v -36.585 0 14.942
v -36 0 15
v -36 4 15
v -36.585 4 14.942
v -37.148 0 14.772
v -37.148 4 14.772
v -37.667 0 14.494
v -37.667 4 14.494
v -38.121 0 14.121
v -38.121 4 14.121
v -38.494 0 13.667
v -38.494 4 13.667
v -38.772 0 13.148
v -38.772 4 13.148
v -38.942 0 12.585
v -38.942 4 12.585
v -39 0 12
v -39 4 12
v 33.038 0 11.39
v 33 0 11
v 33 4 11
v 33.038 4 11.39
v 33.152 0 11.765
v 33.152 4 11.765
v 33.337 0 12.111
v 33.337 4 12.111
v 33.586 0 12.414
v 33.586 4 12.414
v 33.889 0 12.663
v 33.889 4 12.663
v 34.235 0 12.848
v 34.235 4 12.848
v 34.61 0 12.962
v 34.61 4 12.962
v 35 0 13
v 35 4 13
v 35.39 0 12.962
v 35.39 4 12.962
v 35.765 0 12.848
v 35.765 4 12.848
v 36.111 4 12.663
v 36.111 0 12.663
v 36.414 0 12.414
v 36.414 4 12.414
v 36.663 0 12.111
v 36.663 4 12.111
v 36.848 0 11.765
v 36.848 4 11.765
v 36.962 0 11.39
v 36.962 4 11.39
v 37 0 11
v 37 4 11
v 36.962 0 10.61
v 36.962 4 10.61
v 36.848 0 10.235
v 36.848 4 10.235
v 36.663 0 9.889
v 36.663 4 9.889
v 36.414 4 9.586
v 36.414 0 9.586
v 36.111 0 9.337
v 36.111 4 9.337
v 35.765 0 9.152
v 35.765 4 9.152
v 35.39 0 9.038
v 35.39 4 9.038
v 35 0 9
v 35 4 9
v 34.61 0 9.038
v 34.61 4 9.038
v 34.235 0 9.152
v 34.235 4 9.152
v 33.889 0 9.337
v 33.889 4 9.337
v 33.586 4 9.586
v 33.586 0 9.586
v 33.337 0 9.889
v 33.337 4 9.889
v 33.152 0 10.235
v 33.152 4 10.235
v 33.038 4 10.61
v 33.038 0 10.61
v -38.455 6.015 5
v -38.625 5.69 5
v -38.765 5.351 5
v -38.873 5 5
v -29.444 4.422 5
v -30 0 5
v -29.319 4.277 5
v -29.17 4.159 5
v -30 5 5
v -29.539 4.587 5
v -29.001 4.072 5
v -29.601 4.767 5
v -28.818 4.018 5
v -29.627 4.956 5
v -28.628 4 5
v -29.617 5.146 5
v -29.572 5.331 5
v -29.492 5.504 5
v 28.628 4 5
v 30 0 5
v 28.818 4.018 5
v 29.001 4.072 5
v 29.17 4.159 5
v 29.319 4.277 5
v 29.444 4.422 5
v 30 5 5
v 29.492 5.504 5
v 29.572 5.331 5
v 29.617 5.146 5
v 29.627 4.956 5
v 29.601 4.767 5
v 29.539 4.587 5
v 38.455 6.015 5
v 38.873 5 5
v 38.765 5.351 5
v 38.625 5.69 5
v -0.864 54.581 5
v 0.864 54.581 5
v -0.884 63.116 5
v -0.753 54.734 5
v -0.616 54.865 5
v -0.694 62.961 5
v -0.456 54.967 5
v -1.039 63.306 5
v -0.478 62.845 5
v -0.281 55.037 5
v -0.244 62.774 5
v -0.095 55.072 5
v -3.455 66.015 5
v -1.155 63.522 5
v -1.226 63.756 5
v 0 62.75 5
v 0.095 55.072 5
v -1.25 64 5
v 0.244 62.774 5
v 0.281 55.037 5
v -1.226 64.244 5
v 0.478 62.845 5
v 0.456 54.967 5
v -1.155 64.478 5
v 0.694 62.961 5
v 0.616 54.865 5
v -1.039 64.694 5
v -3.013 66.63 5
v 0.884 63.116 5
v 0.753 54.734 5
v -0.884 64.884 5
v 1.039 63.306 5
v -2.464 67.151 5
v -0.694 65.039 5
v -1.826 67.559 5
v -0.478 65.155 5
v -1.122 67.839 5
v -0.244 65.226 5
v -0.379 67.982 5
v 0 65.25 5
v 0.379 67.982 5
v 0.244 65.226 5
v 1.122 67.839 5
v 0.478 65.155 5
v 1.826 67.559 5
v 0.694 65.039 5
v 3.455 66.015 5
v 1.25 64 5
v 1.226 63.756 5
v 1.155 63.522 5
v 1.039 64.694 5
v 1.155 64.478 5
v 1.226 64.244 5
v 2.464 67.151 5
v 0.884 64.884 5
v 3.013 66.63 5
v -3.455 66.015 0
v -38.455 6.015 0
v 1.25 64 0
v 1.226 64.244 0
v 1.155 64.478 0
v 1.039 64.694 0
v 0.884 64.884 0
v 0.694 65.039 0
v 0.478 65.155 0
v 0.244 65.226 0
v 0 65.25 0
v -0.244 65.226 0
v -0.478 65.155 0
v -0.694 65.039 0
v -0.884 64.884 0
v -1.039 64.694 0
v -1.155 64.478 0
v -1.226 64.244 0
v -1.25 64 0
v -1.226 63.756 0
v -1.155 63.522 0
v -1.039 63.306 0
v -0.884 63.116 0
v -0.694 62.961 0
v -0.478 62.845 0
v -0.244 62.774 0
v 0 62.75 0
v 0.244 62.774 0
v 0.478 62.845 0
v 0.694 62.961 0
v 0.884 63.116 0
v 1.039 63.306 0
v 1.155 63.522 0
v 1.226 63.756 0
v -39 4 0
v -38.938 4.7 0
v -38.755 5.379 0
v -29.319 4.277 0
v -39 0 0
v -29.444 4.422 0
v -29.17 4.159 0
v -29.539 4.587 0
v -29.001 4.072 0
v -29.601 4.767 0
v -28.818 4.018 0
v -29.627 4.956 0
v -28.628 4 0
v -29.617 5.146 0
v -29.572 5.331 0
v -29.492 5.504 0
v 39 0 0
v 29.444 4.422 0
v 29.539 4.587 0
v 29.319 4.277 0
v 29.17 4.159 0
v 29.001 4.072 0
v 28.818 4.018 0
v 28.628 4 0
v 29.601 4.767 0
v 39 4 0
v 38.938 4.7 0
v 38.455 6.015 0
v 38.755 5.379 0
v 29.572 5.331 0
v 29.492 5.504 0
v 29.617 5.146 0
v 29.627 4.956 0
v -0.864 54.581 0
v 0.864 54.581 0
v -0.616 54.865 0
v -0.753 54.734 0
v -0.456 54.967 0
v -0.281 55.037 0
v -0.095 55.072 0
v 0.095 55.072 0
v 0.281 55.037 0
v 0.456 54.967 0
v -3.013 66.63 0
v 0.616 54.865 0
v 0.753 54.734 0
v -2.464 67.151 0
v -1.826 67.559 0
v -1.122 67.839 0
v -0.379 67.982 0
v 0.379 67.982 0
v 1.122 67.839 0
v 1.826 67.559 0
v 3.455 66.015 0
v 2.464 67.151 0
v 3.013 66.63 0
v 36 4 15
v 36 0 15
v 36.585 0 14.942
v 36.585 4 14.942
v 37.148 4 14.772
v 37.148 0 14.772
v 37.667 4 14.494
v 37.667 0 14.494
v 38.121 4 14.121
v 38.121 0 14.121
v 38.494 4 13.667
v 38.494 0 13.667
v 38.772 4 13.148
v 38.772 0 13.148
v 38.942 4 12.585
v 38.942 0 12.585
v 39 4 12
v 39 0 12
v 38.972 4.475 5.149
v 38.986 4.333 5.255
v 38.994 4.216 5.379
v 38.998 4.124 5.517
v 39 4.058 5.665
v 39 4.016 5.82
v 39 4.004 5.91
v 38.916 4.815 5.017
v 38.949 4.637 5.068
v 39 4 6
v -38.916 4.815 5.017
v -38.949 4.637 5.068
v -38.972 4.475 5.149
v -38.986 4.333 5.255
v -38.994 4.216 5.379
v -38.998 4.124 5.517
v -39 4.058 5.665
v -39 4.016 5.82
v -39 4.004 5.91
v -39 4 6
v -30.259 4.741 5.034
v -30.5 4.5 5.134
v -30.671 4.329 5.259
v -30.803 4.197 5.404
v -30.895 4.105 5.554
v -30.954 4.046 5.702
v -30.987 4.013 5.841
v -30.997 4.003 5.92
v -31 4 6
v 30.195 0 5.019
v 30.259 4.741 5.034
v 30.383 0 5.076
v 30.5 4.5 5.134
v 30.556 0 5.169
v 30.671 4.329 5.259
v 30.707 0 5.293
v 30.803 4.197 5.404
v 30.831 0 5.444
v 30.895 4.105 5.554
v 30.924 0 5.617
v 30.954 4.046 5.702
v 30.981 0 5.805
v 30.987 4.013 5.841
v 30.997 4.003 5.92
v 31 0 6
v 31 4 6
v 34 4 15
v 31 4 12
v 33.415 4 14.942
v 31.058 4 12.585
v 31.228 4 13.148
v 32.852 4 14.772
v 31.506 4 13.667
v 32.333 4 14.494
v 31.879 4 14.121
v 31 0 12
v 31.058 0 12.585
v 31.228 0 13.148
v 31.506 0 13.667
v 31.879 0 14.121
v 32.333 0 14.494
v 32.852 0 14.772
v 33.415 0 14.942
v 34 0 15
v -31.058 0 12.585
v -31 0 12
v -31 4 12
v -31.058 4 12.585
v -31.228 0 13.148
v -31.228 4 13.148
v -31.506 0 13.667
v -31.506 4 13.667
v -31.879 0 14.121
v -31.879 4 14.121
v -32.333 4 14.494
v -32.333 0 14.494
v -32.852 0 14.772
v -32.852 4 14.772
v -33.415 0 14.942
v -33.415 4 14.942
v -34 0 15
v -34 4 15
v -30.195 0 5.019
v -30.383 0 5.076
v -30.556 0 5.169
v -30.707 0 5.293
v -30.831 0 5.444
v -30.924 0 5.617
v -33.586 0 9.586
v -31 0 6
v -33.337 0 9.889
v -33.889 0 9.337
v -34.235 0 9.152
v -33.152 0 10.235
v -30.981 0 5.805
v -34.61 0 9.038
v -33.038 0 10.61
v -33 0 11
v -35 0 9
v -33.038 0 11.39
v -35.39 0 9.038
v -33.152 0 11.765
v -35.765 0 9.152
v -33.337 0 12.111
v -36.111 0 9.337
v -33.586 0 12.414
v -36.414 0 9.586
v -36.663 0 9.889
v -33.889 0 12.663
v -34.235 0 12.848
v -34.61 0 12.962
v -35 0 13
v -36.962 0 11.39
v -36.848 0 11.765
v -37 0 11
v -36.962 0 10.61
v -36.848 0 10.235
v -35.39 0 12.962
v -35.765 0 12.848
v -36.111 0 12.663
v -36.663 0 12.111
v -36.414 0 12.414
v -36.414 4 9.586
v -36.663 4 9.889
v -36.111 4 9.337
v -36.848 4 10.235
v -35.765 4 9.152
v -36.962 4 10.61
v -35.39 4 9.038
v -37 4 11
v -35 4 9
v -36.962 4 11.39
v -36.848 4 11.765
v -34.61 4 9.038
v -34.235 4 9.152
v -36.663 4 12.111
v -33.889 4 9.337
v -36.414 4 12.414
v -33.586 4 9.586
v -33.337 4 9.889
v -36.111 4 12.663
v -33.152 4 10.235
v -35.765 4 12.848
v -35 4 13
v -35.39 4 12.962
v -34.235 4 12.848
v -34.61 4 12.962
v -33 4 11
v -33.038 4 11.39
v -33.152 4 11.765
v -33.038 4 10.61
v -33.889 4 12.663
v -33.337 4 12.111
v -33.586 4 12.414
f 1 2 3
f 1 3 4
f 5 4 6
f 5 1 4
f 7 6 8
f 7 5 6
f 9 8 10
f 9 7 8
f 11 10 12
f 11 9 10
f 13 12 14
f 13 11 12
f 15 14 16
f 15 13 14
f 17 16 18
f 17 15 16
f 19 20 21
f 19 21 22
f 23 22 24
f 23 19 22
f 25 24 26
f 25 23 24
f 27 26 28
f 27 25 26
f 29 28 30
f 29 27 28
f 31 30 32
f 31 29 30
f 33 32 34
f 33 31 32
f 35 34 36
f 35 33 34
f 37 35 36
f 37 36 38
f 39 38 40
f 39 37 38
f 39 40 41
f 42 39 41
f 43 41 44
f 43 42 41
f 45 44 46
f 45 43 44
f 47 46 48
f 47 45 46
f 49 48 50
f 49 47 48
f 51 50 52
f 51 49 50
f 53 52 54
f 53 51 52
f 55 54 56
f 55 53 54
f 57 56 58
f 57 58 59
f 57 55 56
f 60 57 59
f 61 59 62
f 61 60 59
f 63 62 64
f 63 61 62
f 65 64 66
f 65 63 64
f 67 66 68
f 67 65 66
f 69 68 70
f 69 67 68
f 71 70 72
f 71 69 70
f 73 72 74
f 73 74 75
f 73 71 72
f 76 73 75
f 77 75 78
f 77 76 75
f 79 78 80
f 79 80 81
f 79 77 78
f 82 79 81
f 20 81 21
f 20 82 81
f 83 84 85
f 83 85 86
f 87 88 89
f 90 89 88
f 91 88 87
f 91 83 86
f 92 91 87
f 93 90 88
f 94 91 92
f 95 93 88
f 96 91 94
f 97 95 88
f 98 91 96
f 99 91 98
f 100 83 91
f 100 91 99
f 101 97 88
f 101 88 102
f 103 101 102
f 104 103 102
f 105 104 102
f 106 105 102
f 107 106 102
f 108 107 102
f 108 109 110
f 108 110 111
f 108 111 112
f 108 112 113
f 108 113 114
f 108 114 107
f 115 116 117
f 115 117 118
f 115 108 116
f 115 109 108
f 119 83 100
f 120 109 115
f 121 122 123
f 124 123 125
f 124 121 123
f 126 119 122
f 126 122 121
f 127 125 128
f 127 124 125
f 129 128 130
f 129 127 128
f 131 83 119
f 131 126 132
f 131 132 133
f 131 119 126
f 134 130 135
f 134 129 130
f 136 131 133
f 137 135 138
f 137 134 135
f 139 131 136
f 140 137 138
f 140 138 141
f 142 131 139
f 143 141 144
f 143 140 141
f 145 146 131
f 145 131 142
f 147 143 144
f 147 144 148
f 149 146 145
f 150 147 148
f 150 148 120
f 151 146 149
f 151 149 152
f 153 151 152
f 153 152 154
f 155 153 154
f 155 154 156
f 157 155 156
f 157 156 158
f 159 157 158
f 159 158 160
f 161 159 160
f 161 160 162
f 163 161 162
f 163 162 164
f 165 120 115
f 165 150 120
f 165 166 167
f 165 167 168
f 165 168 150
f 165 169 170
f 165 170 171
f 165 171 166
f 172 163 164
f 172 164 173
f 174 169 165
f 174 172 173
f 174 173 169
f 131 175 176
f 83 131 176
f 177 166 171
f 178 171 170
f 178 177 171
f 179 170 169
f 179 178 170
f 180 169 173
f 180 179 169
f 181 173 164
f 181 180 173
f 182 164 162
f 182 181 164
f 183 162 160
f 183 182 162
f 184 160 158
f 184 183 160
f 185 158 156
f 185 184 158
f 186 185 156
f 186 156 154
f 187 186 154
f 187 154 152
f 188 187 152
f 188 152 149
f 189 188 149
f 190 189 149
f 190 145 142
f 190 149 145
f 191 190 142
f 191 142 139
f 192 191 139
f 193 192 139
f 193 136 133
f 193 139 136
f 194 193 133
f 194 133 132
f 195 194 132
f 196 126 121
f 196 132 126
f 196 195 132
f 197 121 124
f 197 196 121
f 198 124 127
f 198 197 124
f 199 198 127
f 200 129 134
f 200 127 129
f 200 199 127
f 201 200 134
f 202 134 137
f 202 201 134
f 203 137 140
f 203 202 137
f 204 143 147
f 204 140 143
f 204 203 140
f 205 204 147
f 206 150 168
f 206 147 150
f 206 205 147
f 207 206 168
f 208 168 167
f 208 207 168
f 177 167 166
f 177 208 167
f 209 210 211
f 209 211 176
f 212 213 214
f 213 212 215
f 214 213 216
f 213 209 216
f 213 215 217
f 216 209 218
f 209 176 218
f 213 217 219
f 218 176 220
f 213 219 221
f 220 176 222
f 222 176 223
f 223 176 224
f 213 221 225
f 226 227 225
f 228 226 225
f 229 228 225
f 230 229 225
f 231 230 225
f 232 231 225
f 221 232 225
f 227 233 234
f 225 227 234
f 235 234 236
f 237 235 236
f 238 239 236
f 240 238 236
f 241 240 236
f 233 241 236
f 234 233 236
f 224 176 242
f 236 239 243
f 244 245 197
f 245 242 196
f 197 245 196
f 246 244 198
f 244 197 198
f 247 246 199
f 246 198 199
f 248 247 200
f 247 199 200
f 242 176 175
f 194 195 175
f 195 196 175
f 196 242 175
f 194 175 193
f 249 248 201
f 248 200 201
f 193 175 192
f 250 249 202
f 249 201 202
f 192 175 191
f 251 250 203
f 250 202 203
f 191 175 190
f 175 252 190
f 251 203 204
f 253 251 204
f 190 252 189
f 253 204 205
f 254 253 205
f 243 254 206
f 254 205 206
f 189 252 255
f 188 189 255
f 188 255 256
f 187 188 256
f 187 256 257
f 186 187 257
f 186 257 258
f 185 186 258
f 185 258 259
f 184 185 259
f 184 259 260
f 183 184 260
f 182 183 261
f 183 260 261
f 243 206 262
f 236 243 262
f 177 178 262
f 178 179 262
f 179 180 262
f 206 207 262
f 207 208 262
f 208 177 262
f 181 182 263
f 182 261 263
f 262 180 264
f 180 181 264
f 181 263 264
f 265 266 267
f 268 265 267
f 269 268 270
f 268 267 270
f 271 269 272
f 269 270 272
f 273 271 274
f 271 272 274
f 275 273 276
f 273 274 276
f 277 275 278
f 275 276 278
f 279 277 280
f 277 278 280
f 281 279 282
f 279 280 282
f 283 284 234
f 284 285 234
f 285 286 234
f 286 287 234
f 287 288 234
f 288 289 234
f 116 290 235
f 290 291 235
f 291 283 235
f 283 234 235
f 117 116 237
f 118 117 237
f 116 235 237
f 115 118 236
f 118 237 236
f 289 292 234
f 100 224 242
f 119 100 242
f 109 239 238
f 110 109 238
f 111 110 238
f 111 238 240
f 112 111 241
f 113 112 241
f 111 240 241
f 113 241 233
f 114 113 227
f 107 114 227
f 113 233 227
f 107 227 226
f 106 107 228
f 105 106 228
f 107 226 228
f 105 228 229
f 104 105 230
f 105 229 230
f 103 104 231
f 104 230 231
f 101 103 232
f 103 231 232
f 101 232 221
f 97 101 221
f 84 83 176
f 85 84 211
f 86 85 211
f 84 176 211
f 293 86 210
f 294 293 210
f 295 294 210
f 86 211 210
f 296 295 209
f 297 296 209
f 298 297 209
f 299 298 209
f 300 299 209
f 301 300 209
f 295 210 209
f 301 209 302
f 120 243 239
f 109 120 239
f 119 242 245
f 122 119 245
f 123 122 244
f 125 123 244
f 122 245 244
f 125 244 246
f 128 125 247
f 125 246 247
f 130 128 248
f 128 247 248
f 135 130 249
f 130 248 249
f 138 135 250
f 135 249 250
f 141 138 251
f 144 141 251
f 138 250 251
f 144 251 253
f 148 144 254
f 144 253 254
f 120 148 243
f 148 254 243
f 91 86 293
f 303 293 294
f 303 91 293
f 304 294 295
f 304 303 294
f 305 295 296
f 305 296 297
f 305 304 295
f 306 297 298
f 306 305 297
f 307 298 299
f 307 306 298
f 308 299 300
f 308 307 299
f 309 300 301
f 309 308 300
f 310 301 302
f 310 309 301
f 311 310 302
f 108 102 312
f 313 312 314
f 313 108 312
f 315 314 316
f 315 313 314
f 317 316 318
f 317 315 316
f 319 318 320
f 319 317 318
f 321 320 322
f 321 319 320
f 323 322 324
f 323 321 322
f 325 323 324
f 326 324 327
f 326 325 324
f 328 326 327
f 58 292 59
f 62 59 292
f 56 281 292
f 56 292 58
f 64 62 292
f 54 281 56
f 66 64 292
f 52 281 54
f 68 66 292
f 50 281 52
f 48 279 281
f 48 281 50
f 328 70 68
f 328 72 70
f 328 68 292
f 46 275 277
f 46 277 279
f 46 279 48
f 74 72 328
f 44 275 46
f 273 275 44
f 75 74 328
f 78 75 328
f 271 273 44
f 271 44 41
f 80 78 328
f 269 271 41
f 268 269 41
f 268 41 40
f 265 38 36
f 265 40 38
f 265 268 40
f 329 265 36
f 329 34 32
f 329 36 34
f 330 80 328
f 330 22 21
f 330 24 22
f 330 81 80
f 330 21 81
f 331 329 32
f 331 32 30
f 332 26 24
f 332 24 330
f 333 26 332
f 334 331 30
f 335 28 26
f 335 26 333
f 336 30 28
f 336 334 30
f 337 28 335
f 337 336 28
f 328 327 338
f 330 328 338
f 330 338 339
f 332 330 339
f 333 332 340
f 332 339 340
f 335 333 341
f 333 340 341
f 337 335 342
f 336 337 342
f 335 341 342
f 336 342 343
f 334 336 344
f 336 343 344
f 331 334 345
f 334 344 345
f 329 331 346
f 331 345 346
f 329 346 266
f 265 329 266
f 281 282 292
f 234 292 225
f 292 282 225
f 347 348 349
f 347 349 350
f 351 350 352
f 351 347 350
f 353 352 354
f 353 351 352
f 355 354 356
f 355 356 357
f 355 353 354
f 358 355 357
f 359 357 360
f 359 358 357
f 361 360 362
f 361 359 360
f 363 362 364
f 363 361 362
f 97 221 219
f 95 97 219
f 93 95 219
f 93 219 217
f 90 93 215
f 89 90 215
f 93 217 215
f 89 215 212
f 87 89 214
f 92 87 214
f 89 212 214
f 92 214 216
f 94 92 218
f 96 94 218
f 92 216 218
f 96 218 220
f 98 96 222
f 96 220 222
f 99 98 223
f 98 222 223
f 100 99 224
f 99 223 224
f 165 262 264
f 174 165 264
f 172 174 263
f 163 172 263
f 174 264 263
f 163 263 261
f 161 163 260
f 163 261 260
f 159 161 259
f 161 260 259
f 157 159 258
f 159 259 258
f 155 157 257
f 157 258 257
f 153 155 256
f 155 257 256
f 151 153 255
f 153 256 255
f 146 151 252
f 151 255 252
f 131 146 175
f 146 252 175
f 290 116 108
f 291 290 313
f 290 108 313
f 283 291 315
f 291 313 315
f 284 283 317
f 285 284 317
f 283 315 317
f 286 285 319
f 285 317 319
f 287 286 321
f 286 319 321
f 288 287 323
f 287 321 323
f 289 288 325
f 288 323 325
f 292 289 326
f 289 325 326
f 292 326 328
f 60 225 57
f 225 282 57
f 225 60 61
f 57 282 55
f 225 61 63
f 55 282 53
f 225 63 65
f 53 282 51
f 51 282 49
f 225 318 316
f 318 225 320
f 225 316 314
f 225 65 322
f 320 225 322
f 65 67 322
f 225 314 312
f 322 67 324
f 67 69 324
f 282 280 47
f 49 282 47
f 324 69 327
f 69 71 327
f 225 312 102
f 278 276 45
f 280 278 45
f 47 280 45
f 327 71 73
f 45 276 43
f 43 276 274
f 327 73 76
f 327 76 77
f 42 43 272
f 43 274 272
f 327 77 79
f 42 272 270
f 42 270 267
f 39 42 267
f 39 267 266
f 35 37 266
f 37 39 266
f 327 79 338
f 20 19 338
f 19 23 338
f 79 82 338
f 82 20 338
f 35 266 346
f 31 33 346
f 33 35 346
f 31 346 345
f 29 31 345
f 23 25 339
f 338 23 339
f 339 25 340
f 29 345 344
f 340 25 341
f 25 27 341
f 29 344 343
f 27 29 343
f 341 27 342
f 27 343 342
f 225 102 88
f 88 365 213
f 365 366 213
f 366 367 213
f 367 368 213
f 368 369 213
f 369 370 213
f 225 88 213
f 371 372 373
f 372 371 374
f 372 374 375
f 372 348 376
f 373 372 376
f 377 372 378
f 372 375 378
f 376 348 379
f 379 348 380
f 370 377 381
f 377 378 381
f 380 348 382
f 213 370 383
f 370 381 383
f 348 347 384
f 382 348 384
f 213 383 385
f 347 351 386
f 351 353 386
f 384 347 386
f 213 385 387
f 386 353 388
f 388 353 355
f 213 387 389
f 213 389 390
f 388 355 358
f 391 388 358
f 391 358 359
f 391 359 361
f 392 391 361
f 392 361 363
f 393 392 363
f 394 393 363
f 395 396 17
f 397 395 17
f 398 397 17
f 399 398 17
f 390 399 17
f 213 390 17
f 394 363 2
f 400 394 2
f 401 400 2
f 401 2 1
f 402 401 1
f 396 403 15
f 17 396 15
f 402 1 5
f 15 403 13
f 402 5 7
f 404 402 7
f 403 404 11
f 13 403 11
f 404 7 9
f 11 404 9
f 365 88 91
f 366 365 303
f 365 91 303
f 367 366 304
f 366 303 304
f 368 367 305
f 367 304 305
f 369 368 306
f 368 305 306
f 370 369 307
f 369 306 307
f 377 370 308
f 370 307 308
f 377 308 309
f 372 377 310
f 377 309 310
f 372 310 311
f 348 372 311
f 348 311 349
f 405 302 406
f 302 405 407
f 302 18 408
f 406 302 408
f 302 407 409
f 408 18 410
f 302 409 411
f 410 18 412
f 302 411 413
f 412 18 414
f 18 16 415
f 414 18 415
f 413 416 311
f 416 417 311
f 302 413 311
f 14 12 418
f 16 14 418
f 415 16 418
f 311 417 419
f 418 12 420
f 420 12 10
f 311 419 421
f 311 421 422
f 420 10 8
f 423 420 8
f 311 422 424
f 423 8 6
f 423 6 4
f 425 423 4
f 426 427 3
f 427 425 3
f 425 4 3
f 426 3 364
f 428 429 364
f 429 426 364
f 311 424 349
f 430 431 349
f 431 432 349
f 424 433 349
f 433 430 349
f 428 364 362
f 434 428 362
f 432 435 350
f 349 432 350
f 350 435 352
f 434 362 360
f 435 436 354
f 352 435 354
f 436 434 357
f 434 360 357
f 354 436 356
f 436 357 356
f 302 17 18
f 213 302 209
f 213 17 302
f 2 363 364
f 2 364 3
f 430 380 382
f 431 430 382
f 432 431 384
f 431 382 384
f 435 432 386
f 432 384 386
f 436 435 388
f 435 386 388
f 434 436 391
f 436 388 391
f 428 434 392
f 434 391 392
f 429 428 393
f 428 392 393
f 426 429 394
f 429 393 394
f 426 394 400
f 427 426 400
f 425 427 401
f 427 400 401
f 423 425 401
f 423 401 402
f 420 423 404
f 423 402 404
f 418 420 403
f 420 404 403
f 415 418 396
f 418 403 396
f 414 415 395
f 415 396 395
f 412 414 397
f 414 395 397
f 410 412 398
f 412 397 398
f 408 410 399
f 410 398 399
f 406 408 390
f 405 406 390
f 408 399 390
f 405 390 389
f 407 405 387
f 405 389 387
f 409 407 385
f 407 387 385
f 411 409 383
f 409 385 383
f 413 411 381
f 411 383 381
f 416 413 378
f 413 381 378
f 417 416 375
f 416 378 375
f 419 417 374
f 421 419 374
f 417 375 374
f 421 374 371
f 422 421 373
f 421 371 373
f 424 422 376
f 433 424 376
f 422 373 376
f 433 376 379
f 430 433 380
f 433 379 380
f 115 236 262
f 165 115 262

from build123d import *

# Parameters (mm, degrees)
F0_R     = 1.25
F1_DEPTH = 5
F2_R     = 2
F3_DEPTH = 4
F5_R     = 1


with BuildPart() as f1:
    # F0 (on Top) → F1 (new body)
    with BuildSketch(Plane.XY):
        with BuildLine():
            ThreePointArc((3.4551156036, 66.0154841021), (0, 68), (-3.4551156036, 66.0154841021))
            Line((-3.4551156036, 66.0154841021), (-38.4551156036, 6.0154841021))
            ThreePointArc((-38.4551156036, 6.0154841021), (-38.8613768538, 5.0439199169), (-39, 4))
            Line((-39, 4), (-39, 0))
            Line((-39, 0), (39, 0))
            Line((39, 0), (39, 4))
            ThreePointArc((39, 4), (38.8613768538, 5.0439199169), (38.4551156036, 6.0154841021))
            Line((38.4551156036, 6.0154841021), (3.4551156036, 66.0154841021))
        make_face()
        with BuildLine():
            Line((-29.4919272386, 5.5038710255), (-0.8637789009, 54.5806967473))
            ThreePointArc((-0.8637789009, 54.5806967473), (0, 55.0768257218), (0.8637789009, 54.5806967473))
            Line((0.8637789009, 54.5806967473), (29.4919272386, 5.5038710255))
            ThreePointArc((29.4919272386, 5.5038710255), (29.4952904903, 4.5019392735), (28.6281483377, 4))
            Line((28.6281483377, 4), (-28.6281483377, 4))
            ThreePointArc((-28.6281483377, 4), (-29.4952904903, 4.5019392735), (-29.4919272386, 5.5038710255))
        make_face(mode=Mode.SUBTRACT)
        with Locations((0, 64)):
            Circle(F0_R, mode=Mode.SUBTRACT)
    extrude(amount=F1_DEPTH)

    # F2 (on Front) → F3 (join)
    with BuildSketch(Plane.XZ):
        with BuildLine():
            Line((-39, 12), (-39, 0))
            Line((-39, 0), (-31, 0))
            Line((-31, 0), (-31, 12))
            ThreePointArc((-31, 12), (-31.8786796564, 14.1213203436), (-34, 15))
            Line((-34, 15), (-36, 15))
            ThreePointArc((-36, 15), (-38.1213203436, 14.1213203436), (-39, 12))
        make_face()
        with Locations((-35, 11)):
            Circle(F2_R, mode=Mode.SUBTRACT)
    extrude(amount=-F3_DEPTH)

    # F4: F1 across plane


with BuildPart() as f1_1:
    add(f1.part)
    add(f1.part.mirror(Plane.YZ))

    # F5
    f5_edges = [f1_1.edges().sort_by_distance(p)[0] for p in [
        (-35, 4, 5),
        (-31, 2, 5),
        (31, 2, 5),
        (35, 4, 5),
    ]]
    fillet(f5_edges, radius=F5_R)


solid = f1_1.part
